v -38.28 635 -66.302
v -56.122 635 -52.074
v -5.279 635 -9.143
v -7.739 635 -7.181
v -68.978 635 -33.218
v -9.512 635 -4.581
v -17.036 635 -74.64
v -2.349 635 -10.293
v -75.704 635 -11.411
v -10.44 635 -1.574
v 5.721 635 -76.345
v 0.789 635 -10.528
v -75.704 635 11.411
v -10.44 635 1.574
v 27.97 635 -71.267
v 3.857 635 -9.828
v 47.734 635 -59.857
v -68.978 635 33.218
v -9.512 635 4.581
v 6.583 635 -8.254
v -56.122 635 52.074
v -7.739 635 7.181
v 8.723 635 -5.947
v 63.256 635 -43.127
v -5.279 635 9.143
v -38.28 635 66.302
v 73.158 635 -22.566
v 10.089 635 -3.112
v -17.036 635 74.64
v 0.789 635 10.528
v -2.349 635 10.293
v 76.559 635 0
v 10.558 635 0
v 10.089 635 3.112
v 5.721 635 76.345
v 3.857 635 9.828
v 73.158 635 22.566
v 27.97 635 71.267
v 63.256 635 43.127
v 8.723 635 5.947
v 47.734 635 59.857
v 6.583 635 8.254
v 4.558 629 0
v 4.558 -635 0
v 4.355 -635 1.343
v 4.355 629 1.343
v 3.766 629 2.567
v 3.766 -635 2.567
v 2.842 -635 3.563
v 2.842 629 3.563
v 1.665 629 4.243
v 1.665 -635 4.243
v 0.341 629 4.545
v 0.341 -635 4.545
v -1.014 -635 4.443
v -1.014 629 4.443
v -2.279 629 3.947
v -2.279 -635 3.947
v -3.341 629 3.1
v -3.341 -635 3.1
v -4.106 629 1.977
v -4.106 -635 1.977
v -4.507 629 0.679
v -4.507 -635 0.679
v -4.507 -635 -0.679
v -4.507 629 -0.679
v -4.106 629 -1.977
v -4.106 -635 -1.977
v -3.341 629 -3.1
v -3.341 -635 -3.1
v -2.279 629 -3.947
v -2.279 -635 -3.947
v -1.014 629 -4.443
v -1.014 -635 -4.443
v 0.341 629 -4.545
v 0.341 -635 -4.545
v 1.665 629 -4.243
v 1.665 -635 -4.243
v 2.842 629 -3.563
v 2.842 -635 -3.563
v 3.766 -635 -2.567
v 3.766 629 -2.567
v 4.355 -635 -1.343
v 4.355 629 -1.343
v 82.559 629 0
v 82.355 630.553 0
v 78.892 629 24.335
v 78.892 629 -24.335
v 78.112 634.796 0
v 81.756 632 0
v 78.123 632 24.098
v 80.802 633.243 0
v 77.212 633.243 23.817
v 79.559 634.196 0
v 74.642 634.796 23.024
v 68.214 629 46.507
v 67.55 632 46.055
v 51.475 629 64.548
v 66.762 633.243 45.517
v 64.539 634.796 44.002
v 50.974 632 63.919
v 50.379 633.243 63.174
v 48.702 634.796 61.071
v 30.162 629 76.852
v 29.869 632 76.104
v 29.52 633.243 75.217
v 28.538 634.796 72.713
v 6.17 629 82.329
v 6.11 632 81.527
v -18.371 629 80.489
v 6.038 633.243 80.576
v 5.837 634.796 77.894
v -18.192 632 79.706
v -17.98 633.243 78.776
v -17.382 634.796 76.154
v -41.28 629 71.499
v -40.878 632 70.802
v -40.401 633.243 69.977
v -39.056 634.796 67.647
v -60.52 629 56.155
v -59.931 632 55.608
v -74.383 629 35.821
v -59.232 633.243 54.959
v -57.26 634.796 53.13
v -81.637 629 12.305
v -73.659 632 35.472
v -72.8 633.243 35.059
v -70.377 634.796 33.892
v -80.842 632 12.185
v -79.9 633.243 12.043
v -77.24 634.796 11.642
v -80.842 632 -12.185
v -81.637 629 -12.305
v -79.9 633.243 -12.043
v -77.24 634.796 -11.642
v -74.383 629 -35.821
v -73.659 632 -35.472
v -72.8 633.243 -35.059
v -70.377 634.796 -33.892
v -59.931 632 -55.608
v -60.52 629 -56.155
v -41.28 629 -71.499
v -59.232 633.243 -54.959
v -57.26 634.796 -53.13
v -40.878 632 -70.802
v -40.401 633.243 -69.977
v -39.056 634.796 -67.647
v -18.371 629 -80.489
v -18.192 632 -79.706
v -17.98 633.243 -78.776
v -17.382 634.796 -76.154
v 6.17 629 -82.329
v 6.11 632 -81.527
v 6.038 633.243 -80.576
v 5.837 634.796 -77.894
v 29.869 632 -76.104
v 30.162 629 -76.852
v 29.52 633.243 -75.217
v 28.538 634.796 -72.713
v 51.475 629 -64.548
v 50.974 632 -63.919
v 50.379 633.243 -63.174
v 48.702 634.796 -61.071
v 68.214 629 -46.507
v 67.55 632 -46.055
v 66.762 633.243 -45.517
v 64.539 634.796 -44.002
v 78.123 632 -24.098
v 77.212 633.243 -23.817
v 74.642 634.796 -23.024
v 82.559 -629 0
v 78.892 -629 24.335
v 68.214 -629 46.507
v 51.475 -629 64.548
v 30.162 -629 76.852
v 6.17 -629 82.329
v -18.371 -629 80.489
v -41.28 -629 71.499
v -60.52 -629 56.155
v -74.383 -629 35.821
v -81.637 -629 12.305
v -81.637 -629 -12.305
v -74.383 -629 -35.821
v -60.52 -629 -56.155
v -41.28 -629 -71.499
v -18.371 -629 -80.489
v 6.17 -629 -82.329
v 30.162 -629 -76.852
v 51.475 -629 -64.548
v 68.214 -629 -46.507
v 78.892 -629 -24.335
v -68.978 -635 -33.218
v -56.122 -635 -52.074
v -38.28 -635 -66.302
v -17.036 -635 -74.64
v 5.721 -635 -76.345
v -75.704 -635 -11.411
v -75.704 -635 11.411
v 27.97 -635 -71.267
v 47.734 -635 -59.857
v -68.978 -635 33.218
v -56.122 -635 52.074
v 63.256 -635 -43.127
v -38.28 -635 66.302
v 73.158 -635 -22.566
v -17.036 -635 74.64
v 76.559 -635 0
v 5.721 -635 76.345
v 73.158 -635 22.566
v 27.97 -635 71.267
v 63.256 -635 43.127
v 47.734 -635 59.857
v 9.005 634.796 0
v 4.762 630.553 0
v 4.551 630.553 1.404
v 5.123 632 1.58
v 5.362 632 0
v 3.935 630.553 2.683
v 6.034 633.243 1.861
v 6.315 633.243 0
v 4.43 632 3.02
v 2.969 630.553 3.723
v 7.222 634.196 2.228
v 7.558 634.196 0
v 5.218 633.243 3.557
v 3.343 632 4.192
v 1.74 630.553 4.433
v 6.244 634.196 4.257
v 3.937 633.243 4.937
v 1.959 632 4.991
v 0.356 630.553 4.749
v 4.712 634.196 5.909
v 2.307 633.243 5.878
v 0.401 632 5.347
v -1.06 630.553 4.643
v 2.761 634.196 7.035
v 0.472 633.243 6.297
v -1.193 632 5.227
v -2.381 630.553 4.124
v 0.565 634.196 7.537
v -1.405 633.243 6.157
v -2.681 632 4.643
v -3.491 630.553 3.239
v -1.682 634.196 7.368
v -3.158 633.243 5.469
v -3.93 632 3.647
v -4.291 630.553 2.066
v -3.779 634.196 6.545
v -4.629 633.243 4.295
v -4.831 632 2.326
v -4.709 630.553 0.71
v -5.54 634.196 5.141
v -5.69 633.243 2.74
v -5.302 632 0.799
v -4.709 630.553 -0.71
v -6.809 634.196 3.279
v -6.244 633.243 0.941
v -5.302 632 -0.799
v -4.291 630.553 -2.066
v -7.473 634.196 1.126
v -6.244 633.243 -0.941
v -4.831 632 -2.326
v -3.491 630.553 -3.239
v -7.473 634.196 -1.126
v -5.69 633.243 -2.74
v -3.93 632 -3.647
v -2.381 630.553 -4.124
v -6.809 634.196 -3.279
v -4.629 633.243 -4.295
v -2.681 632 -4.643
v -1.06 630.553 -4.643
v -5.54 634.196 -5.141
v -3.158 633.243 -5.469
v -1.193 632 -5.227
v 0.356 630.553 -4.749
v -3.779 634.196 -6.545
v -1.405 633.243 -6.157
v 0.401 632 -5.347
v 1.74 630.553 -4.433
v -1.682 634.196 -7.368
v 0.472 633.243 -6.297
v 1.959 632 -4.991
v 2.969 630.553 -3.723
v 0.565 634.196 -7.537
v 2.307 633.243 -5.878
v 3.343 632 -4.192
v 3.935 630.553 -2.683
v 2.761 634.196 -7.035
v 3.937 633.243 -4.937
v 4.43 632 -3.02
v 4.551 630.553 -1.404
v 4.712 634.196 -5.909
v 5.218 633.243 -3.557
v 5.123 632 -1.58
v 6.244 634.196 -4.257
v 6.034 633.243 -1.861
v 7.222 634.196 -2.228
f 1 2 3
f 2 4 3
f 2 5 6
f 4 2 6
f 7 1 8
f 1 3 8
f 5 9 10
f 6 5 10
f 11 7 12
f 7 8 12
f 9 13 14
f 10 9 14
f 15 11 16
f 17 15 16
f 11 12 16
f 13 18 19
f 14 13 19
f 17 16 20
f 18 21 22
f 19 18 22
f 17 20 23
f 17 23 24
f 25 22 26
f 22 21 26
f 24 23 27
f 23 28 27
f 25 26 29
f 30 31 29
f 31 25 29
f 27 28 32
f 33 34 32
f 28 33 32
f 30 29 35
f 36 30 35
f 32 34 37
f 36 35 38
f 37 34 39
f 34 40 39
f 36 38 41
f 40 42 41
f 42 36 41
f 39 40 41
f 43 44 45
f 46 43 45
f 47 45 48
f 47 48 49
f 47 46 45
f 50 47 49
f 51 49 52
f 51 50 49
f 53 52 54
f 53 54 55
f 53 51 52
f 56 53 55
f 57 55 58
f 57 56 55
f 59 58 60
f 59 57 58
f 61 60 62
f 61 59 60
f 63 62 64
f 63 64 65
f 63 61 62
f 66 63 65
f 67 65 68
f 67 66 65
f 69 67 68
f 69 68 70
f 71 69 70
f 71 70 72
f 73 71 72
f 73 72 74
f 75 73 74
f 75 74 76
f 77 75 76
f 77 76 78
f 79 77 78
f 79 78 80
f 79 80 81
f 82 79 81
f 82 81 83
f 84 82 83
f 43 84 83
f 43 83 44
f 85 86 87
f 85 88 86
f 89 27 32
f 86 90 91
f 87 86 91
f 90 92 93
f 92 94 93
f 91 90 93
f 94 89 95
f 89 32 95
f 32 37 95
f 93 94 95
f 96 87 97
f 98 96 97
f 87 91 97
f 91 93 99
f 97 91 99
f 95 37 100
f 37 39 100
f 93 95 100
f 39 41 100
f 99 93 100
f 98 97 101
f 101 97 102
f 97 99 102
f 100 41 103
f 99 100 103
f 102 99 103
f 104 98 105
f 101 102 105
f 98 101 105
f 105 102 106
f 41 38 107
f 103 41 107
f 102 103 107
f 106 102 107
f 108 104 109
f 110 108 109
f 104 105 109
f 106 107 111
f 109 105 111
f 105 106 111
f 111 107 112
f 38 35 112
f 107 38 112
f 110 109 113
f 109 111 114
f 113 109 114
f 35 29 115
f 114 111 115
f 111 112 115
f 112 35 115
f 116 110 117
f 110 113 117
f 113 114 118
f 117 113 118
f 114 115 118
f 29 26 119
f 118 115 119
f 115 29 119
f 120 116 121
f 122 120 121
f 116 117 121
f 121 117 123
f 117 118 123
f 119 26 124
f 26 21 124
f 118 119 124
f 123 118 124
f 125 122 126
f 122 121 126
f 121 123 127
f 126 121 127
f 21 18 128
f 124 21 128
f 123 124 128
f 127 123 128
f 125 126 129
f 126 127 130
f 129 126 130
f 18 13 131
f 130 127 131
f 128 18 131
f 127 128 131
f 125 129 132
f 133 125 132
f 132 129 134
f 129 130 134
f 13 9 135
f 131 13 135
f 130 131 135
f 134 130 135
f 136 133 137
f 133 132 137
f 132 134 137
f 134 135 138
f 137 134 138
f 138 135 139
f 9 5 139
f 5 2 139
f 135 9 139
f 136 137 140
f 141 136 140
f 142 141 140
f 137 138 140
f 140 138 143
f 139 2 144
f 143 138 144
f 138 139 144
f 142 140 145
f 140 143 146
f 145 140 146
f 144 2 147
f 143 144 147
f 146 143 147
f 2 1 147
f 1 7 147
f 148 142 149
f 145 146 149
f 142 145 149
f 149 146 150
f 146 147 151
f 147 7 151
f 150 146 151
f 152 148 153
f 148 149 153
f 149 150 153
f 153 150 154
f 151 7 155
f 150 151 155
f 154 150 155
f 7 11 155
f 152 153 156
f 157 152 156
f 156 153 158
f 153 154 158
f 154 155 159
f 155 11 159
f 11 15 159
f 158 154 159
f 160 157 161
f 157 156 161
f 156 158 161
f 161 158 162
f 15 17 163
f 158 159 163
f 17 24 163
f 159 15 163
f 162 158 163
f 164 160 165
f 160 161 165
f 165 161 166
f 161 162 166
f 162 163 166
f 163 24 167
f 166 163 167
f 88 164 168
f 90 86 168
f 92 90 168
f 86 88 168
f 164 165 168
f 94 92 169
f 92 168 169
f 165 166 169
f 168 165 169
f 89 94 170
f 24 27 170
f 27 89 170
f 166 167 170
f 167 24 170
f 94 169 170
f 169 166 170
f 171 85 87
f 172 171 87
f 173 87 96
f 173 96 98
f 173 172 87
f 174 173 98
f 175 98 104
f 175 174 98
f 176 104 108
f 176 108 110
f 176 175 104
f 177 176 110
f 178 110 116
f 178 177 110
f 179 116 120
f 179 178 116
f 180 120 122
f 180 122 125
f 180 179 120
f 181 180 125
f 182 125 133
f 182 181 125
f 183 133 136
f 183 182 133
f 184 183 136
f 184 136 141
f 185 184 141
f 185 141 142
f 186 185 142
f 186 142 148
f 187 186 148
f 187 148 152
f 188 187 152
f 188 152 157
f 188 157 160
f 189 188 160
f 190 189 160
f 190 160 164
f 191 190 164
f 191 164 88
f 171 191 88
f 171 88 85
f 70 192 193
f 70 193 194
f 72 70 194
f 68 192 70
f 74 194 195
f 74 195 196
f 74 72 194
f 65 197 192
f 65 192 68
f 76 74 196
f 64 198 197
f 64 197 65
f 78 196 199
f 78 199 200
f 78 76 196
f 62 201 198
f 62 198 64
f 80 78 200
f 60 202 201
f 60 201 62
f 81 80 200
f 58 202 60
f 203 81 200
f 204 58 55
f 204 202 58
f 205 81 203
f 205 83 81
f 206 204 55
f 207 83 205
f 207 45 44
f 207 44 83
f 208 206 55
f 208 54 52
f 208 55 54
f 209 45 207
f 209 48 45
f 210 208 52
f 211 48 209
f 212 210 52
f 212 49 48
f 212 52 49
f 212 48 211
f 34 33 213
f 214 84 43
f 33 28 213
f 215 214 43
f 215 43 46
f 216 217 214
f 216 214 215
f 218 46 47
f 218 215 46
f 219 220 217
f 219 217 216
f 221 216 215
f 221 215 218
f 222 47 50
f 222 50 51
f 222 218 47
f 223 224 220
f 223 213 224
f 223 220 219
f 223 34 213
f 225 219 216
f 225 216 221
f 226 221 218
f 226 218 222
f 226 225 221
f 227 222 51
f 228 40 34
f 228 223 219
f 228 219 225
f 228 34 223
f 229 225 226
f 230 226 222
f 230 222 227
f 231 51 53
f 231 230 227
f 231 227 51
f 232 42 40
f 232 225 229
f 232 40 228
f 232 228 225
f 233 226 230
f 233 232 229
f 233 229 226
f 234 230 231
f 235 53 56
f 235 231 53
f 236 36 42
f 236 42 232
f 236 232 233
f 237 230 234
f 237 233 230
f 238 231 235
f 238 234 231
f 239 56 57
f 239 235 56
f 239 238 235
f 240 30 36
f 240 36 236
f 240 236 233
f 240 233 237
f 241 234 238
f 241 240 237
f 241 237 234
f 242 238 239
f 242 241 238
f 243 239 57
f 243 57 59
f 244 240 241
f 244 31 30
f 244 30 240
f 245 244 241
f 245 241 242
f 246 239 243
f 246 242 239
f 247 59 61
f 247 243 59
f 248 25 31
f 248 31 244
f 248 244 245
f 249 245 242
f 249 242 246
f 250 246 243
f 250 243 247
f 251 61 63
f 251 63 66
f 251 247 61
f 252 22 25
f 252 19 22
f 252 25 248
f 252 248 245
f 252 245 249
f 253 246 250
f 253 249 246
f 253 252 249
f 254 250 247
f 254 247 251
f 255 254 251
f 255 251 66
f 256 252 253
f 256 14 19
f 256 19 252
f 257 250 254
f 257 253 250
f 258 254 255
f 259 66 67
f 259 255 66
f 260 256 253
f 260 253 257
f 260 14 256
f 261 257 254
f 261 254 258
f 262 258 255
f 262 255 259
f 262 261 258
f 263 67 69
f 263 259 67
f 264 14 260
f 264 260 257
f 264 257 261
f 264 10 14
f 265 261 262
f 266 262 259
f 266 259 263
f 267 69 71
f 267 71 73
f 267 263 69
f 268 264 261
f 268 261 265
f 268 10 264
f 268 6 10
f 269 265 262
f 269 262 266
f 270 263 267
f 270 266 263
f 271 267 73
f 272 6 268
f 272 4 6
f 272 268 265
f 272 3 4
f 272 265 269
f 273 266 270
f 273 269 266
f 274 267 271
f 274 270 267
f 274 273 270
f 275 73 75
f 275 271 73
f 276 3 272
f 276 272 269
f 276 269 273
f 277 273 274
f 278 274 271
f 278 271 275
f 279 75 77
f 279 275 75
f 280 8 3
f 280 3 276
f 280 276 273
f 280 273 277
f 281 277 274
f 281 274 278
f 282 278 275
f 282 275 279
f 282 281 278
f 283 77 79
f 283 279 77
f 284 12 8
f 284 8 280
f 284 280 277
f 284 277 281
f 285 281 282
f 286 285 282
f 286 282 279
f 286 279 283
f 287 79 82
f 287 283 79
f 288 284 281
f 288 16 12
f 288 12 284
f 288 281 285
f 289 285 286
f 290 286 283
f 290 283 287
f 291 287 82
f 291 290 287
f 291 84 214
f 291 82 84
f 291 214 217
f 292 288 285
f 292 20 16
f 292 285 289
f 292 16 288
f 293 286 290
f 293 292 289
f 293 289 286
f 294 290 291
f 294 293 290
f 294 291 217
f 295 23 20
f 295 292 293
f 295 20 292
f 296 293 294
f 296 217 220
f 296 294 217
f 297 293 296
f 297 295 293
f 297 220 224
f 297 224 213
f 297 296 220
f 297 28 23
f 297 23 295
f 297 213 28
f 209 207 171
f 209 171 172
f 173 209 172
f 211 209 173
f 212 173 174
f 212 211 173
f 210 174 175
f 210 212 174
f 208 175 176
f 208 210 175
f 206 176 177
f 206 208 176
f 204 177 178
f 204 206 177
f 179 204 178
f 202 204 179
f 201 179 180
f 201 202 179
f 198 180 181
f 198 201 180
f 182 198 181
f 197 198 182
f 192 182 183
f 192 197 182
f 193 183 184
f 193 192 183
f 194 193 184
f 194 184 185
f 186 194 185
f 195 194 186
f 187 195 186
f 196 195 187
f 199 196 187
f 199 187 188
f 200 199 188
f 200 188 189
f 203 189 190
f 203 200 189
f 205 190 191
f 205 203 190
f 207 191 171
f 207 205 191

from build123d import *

# Parameters (mm, degrees)
F0_R     = 82.559423
F0_R_2   = 4.557666
F1_DEPTH = 635
F2_R     = 6
F3_SIZE  = 6


with BuildPart() as f1:
    # F0 (on Front) → F1 (new body, symmetric)
    with BuildSketch(Plane.XZ):
        Circle(F0_R)
        Circle(F0_R_2, mode=Mode.SUBTRACT)
    extrude(amount=F1_DEPTH, both=True)

    # F2
    f2_edges = [f1.edges().sort_by_distance(p)[0] for p in [
        (-82.559423, 635, 0),
        (-4.557666, 635, 0),
    ]]
    fillet(f2_edges, radius=F2_R)

    # F3
    f3_edges = [f1.edges().sort_by_distance(p)[0] for p in [
        (-82.559423, -635, 0),
    ]]
    chamfer(f3_edges, length=F3_SIZE)


solid = f1.part
